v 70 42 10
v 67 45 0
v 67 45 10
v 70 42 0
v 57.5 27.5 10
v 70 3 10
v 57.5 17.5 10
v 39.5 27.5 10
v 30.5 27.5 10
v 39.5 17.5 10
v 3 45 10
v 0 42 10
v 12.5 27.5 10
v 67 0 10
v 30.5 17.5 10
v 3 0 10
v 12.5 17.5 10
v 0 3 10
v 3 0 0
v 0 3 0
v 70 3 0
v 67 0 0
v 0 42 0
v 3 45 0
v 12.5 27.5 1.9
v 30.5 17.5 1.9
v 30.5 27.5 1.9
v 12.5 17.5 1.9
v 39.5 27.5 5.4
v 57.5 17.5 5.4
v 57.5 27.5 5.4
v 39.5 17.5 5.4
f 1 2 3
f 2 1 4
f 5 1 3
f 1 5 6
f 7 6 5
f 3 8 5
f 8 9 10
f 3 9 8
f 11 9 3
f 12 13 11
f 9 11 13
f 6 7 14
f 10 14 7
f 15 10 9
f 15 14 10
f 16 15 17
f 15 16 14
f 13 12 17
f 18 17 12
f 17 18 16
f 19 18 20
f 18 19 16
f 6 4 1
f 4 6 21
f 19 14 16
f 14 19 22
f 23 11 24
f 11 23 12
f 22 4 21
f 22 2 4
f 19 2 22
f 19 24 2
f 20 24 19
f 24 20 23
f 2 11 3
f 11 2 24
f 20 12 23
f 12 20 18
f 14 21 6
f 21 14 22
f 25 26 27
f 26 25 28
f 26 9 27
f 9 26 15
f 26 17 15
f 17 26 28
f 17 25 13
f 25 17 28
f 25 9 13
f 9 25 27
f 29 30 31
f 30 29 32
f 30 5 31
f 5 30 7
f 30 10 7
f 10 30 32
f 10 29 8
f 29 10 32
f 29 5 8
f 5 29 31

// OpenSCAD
$fn = 32;

// ----------------------------------------------------------------------
// Windowed plate: 2 voids, 70 x 45 x 10 mm
// ----------------------------------------------------------------------

// --- parameters (mm) ---
plate_l = 70;             // plate length, X
plate_w = 45;             // plate width, Y
plate_t = 10;             // plate thickness, Z
edge_margin = 8;          // wall from the plate edge to any window
windows = 2;              // number of windows in the row
win_l = 18;               // window length
win_w = 10;               // window width
win_pitch = 27;           // window pitch along X
depth_1 = 8.1;            // depth of void 1 (full thickness = through)
depth_2 = 4.6;            // depth of void 2 (full thickness = through)
corner_c = 3;             // corner chamfer of the plate
fit_tol = 0.1;            // declared fit tolerance (prompt contract)
free_tol = 0.5;           // declared free tolerance (prompt contract)

profile = [[3, 0], [67, 0], [70, 3], [70, 42], [67, 45], [3, 45], [0, 42], [0, 3]];  // primary outline, 8 points, counter clockwise
void_1 = [[12.5, 17.5], [30.5, 17.5], [30.5, 27.5], [12.5, 27.5]];  // window 1 of the row, 4 points
void_2 = [[39.5, 17.5], [57.5, 17.5], [57.5, 27.5], [39.5, 27.5]];  // window 2 of the row, 4 points

// --- the one profile operation ---
difference() {
  linear_extrude(height = plate_t) polygon(points = profile);
  translate([0, 0, plate_t - depth_1])
    linear_extrude(height = depth_1 + 1) polygon(points = void_1);
  translate([0, 0, plate_t - depth_2])
    linear_extrude(height = depth_2 + 1) polygon(points = void_2);
}
